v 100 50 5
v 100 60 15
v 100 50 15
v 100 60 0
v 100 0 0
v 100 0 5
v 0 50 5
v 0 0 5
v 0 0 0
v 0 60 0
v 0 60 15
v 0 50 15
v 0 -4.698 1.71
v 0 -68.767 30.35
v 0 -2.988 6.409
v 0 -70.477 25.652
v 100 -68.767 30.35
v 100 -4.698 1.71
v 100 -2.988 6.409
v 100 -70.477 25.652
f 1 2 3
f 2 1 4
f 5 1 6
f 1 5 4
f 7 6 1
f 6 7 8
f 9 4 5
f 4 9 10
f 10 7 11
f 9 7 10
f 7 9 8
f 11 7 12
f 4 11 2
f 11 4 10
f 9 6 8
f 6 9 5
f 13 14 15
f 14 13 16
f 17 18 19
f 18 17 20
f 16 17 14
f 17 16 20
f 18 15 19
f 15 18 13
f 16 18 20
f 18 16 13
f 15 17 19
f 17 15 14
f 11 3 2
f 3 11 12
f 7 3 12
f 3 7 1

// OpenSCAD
// Parametric Phone Stand
angle = 70;
base_length = 100;
base_width = 60;
thickness = 5;
support_height = 70;

module base() {
    cube([base_length, base_width, thickness]);
}

module support() {
    rotate([angle, 0, 0])
        translate([0, 0, thickness])
            cube([base_length, thickness, support_height]);
}

module stopper() {
    translate([0, base_width - 10, thickness])
        cube([base_length, 10, 10]);
}

union() {
    base();
    support();
    stopper();
}
